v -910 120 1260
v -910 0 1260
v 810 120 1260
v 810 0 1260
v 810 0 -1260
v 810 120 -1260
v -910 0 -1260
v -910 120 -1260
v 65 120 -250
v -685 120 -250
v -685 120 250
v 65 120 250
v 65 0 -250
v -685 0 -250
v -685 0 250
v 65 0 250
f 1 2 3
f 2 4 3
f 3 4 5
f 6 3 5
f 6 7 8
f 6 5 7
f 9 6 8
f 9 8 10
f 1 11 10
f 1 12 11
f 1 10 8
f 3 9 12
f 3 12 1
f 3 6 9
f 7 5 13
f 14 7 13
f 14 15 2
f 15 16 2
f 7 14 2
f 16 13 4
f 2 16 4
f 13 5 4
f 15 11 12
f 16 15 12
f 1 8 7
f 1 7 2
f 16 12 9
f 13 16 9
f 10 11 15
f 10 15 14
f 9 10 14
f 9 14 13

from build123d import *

# Parameters (mm, degrees)
CROQUIS1_W              = 1620
CROQUIS1_H              = 2520
SALIENTE_EXTRUIR1_DEPTH = 120
CROQUIS2_W              = 750
CROQUIS2_H              = 500
CORTAR_EXTRUIR1_DEPTH   = 120
CROQUIS3_W              = 2520
CROQUIS3_H              = 120
SALIENTE_EXTRUIR2_DEPTH = 100


with BuildPart() as part:
    # Croquis1 → Saliente-Extruir1 (new body)
    with BuildSketch(Plane(origin=(0, 0, 0), x_dir=(1, 0, 0), z_dir=(0, 1, 0))):
        Rectangle(CROQUIS1_W, CROQUIS1_H)
    extrude(amount=SALIENTE_EXTRUIR1_DEPTH)

    # Croquis2 → Cortar-Extruir1 (cut)
    with BuildSketch(Plane(origin=(0, 120, 0), x_dir=(1, 0, 0), z_dir=(0, 1, 0))):
        with Locations((-310, 0)):
            Rectangle(CROQUIS2_W, CROQUIS2_H)
    extrude(amount=-CORTAR_EXTRUIR1_DEPTH, mode=Mode.SUBTRACT)

    # Croquis3 → Saliente-Extruir2 (add)
    with BuildSketch(Plane.ZY.offset(810)):
        with Locations((0, 60)):
            Rectangle(CROQUIS3_W, CROQUIS3_H)
    extrude(amount=SALIENTE_EXTRUIR2_DEPTH)


solid = part.part
